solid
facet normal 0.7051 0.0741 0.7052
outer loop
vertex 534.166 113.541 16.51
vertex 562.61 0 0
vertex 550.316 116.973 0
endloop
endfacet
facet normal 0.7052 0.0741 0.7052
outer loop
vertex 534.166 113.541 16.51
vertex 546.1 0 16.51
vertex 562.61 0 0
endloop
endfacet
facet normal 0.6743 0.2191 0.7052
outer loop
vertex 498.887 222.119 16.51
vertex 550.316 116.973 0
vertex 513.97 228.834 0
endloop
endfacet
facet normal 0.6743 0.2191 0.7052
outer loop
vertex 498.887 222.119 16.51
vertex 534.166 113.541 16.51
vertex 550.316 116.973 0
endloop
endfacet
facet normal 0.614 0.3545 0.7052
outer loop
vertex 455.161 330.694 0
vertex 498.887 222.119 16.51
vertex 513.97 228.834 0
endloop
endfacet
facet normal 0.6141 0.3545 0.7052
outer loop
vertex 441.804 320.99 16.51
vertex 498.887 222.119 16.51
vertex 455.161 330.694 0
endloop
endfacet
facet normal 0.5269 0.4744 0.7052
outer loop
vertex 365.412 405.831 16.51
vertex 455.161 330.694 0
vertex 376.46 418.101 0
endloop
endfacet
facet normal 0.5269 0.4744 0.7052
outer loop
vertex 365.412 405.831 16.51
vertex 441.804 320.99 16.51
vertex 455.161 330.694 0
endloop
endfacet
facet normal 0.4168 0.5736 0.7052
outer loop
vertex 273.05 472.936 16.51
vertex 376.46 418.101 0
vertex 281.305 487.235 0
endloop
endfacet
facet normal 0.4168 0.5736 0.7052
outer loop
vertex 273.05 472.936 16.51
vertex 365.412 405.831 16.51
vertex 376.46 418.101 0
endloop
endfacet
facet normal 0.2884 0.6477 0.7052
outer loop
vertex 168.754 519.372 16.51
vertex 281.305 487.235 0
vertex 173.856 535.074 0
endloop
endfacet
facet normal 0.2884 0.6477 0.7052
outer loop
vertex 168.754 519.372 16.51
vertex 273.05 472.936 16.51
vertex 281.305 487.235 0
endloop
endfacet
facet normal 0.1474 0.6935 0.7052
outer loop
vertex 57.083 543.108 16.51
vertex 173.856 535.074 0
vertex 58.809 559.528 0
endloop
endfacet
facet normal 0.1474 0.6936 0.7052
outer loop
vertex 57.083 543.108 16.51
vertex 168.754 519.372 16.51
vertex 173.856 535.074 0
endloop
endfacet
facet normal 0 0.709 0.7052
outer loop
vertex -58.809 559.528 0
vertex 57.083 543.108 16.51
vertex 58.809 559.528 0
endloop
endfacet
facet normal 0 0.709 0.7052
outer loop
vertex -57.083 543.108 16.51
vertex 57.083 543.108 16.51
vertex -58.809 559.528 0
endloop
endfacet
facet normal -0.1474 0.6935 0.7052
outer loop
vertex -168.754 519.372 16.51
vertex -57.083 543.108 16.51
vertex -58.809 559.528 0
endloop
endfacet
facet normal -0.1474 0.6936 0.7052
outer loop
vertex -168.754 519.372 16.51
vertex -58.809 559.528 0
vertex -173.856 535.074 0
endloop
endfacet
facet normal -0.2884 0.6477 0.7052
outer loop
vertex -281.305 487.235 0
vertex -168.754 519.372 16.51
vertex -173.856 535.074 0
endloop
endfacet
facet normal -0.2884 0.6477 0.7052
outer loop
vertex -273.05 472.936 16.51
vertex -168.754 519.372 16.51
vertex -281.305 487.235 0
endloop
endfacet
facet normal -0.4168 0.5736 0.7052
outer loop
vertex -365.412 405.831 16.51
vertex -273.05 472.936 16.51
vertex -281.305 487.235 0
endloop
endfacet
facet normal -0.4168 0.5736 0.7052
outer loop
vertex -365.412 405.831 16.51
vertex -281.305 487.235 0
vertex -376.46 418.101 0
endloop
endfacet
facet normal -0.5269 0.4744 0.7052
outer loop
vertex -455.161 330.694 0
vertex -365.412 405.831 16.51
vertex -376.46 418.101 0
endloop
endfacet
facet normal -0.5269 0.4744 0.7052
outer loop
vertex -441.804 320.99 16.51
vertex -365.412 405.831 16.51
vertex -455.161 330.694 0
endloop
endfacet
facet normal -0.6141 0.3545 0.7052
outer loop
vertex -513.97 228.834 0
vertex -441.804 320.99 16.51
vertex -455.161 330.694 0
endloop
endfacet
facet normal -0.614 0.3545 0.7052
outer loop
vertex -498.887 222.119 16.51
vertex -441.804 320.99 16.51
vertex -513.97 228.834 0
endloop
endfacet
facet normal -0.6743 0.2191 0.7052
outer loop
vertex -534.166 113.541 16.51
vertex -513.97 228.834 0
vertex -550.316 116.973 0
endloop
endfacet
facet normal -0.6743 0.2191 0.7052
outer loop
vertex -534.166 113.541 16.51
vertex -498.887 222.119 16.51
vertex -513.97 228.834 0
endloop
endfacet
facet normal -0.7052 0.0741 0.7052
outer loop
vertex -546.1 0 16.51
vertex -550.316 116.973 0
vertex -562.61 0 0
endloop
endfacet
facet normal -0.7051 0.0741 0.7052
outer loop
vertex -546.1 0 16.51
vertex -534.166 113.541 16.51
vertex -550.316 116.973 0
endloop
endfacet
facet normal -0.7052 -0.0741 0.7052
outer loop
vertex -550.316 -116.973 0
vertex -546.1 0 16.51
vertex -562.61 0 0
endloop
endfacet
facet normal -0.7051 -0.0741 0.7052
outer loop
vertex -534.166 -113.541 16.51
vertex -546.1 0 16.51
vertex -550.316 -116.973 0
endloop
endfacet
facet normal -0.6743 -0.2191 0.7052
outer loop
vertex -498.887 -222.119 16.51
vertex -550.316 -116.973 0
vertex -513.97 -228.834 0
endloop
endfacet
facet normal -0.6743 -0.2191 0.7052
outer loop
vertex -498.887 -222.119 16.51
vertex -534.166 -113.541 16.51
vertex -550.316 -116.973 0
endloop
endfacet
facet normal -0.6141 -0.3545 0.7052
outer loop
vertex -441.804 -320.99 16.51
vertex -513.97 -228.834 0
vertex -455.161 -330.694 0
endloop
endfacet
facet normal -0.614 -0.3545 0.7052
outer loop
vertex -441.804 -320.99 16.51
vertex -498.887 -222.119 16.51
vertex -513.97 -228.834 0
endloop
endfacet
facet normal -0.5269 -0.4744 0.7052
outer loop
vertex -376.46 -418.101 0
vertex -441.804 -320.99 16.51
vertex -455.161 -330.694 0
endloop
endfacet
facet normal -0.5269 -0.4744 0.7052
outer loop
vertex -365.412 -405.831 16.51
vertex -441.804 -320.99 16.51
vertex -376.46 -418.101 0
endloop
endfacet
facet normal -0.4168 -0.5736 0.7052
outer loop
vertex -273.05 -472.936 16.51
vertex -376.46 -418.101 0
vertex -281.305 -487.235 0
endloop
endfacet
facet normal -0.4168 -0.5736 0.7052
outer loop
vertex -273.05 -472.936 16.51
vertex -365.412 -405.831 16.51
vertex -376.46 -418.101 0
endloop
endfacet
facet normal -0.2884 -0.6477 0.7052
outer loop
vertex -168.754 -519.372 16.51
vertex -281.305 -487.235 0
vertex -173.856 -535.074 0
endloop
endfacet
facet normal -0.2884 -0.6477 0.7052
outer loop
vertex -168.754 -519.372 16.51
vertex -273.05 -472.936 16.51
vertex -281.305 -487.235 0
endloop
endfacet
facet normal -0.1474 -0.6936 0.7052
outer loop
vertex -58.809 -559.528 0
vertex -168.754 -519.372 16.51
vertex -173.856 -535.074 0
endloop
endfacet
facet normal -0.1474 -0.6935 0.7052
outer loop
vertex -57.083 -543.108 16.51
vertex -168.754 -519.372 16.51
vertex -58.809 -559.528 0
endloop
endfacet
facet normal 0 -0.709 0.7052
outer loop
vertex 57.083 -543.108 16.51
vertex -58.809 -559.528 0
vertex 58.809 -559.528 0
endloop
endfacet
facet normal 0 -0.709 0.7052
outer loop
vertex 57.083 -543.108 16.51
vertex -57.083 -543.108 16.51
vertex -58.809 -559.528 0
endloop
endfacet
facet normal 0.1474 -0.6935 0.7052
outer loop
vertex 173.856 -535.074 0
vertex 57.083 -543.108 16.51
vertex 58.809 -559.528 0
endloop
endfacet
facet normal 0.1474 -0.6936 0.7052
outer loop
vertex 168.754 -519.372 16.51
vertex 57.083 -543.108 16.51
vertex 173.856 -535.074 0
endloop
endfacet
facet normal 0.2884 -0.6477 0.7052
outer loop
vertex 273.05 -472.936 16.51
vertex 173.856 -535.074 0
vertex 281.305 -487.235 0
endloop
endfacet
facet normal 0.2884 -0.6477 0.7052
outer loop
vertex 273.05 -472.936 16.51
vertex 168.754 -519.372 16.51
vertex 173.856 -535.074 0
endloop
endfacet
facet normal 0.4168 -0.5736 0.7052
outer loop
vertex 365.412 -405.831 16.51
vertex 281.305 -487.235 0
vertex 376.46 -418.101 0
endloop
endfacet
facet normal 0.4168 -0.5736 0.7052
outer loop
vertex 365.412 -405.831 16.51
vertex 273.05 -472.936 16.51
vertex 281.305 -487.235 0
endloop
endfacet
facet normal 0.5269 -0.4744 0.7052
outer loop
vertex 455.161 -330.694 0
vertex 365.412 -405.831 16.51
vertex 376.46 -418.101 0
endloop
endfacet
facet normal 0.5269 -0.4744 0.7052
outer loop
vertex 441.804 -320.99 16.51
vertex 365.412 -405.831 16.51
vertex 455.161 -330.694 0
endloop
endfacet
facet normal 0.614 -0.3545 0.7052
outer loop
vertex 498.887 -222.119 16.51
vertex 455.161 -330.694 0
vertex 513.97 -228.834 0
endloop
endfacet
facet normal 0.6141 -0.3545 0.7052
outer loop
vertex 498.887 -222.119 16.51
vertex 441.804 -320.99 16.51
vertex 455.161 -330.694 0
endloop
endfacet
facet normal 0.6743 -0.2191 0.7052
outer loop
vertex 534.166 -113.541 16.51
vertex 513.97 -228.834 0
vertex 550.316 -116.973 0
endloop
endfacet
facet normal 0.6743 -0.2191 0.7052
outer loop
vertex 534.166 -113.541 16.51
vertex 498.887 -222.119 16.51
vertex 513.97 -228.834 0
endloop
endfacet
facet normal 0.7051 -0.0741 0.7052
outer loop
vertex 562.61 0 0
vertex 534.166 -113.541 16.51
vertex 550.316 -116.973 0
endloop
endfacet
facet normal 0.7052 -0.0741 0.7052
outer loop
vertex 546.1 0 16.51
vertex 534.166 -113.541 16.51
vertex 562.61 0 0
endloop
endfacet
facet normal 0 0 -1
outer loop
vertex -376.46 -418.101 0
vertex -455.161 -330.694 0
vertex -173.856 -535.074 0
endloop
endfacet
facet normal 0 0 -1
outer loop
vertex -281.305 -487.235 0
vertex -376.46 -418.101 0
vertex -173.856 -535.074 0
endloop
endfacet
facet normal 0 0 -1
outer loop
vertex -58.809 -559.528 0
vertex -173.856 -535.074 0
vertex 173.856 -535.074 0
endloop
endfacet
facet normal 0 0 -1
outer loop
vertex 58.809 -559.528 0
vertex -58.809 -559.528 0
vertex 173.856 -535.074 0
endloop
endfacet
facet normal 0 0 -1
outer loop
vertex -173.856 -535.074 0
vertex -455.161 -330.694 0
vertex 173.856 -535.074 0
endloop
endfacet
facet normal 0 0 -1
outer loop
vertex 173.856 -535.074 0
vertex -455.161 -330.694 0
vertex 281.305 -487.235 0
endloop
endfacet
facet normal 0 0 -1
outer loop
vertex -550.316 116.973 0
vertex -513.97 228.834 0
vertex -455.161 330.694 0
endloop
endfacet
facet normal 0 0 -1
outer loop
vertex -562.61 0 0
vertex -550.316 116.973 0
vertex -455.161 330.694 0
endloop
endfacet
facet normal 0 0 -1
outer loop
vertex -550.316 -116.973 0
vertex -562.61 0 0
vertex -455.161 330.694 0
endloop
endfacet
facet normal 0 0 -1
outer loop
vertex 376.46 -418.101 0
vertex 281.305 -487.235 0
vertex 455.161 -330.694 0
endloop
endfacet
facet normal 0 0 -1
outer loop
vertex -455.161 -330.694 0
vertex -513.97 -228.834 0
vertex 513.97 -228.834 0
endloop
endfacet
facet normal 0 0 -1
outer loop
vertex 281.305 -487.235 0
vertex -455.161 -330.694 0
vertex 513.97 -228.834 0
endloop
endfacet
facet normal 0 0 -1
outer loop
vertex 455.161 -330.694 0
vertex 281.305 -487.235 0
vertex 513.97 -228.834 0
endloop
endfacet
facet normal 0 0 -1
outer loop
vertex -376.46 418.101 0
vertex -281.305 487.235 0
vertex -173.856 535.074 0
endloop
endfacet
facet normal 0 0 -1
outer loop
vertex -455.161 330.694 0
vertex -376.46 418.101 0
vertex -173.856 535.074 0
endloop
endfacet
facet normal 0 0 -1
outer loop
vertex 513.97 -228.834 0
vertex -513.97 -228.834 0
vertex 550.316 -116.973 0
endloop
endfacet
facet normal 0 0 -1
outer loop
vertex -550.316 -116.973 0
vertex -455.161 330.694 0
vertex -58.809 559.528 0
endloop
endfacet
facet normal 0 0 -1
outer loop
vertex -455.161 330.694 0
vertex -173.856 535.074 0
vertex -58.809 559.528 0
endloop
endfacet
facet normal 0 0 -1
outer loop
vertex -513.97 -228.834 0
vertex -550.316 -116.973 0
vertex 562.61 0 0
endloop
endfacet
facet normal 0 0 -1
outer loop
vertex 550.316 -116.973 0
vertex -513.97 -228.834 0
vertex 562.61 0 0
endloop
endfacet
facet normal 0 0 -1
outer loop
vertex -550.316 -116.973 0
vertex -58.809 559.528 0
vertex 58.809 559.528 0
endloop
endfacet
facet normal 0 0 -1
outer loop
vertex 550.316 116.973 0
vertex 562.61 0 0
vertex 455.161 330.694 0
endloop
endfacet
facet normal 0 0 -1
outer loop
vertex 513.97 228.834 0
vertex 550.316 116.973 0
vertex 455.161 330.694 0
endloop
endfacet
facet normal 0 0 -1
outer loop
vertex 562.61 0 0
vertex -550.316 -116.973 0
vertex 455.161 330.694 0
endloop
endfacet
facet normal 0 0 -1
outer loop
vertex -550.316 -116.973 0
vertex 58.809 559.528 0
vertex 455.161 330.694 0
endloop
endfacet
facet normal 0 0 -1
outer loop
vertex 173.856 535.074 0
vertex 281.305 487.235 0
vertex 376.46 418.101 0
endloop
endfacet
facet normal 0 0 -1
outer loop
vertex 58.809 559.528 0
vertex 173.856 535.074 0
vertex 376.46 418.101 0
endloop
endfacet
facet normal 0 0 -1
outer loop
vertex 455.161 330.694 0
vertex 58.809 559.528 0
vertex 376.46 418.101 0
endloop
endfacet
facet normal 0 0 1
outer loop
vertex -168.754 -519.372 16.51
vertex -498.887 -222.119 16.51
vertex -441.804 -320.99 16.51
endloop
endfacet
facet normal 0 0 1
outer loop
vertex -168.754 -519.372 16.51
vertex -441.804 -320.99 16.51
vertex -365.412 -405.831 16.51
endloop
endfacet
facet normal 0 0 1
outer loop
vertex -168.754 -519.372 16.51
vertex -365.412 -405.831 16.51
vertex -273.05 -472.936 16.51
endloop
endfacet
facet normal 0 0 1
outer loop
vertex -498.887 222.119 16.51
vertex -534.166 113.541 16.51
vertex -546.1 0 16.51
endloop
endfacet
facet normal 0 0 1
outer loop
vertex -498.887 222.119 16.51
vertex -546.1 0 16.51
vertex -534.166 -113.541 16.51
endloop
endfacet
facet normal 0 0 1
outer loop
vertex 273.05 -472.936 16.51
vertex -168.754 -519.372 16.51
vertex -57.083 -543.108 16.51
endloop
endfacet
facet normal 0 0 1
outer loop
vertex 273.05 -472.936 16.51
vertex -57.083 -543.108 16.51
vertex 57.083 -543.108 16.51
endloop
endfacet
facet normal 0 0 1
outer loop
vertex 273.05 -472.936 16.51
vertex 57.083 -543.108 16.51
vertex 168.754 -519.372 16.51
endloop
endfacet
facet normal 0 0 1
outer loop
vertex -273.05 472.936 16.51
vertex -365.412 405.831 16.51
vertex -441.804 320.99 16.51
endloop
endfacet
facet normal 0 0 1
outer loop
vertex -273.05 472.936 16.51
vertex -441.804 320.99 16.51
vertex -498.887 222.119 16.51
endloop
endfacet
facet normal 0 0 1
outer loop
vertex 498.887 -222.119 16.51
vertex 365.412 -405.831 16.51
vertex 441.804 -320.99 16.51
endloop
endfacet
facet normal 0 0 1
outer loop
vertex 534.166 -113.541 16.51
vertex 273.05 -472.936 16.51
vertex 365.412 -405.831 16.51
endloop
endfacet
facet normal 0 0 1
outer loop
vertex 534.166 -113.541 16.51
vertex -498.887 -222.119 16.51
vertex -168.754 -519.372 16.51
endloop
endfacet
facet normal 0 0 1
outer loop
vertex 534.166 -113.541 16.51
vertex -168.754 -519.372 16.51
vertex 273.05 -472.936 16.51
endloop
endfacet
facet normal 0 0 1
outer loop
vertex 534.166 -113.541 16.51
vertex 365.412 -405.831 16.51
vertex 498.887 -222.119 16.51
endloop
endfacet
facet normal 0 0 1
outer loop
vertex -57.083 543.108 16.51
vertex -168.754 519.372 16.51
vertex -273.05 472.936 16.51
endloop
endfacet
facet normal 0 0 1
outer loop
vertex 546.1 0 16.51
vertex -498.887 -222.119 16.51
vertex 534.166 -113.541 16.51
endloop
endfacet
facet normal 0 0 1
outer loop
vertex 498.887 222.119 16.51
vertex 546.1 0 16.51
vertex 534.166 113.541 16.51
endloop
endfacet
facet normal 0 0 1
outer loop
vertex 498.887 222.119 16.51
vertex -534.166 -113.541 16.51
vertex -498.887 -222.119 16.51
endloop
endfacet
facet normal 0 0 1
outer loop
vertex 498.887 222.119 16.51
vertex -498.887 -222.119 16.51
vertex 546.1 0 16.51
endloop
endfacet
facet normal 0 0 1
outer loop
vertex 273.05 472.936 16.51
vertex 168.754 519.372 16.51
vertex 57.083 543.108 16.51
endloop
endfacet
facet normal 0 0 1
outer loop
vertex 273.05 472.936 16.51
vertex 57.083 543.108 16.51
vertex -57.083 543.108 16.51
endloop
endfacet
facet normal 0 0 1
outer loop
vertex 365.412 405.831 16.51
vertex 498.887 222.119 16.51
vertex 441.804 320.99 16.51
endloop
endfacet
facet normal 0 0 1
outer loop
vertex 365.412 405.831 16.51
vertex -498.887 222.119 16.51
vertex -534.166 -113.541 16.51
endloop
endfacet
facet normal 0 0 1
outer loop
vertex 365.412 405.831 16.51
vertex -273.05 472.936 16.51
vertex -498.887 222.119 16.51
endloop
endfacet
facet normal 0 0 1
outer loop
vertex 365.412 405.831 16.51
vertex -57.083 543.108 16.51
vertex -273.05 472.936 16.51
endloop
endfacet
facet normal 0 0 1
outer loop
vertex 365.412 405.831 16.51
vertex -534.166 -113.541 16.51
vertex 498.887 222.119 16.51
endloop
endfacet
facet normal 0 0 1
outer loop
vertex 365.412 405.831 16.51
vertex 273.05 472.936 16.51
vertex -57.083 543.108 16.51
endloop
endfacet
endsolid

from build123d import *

# Parameters (mm, degrees)
F0_R     = 571.5
F1_DEPTH = 12.7
F2_DEPTH = 3.81


# Not quite as in the source:
# - a fillet or chamfer that OpenCascade refuses, or shapes differently, is made with other operations: its cross-section is extruded or revolved along the edge and cut away or added


with BuildPart() as f1:
    # F0 (on Top) → F1 (new body)
    with BuildSketch(Plane.XY):
        Circle(F0_R)
    extrude(amount=F1_DEPTH)

    # F2 (add): a face of the model
    f2_faces = [f1.faces().sort_by_distance(p)[0] for p in [
        (0, 0, 12.7),
    ]]
    extrude(f2_faces, amount=F2_DEPTH)

    # F3: chamfer of 25.4 on 1 edges, made by hand

    # F3_s1 → F3_t2 (revolve, cut)
    with BuildSketch(Plane.XZ):
        Polygon((571.5, -8.89), (546.1, 16.51), (571.5, 16.51), align=None)
    revolve(axis=Axis((0, 0, 16.51), (0, 0, 1)), mode=Mode.SUBTRACT)


solid = f1.part
